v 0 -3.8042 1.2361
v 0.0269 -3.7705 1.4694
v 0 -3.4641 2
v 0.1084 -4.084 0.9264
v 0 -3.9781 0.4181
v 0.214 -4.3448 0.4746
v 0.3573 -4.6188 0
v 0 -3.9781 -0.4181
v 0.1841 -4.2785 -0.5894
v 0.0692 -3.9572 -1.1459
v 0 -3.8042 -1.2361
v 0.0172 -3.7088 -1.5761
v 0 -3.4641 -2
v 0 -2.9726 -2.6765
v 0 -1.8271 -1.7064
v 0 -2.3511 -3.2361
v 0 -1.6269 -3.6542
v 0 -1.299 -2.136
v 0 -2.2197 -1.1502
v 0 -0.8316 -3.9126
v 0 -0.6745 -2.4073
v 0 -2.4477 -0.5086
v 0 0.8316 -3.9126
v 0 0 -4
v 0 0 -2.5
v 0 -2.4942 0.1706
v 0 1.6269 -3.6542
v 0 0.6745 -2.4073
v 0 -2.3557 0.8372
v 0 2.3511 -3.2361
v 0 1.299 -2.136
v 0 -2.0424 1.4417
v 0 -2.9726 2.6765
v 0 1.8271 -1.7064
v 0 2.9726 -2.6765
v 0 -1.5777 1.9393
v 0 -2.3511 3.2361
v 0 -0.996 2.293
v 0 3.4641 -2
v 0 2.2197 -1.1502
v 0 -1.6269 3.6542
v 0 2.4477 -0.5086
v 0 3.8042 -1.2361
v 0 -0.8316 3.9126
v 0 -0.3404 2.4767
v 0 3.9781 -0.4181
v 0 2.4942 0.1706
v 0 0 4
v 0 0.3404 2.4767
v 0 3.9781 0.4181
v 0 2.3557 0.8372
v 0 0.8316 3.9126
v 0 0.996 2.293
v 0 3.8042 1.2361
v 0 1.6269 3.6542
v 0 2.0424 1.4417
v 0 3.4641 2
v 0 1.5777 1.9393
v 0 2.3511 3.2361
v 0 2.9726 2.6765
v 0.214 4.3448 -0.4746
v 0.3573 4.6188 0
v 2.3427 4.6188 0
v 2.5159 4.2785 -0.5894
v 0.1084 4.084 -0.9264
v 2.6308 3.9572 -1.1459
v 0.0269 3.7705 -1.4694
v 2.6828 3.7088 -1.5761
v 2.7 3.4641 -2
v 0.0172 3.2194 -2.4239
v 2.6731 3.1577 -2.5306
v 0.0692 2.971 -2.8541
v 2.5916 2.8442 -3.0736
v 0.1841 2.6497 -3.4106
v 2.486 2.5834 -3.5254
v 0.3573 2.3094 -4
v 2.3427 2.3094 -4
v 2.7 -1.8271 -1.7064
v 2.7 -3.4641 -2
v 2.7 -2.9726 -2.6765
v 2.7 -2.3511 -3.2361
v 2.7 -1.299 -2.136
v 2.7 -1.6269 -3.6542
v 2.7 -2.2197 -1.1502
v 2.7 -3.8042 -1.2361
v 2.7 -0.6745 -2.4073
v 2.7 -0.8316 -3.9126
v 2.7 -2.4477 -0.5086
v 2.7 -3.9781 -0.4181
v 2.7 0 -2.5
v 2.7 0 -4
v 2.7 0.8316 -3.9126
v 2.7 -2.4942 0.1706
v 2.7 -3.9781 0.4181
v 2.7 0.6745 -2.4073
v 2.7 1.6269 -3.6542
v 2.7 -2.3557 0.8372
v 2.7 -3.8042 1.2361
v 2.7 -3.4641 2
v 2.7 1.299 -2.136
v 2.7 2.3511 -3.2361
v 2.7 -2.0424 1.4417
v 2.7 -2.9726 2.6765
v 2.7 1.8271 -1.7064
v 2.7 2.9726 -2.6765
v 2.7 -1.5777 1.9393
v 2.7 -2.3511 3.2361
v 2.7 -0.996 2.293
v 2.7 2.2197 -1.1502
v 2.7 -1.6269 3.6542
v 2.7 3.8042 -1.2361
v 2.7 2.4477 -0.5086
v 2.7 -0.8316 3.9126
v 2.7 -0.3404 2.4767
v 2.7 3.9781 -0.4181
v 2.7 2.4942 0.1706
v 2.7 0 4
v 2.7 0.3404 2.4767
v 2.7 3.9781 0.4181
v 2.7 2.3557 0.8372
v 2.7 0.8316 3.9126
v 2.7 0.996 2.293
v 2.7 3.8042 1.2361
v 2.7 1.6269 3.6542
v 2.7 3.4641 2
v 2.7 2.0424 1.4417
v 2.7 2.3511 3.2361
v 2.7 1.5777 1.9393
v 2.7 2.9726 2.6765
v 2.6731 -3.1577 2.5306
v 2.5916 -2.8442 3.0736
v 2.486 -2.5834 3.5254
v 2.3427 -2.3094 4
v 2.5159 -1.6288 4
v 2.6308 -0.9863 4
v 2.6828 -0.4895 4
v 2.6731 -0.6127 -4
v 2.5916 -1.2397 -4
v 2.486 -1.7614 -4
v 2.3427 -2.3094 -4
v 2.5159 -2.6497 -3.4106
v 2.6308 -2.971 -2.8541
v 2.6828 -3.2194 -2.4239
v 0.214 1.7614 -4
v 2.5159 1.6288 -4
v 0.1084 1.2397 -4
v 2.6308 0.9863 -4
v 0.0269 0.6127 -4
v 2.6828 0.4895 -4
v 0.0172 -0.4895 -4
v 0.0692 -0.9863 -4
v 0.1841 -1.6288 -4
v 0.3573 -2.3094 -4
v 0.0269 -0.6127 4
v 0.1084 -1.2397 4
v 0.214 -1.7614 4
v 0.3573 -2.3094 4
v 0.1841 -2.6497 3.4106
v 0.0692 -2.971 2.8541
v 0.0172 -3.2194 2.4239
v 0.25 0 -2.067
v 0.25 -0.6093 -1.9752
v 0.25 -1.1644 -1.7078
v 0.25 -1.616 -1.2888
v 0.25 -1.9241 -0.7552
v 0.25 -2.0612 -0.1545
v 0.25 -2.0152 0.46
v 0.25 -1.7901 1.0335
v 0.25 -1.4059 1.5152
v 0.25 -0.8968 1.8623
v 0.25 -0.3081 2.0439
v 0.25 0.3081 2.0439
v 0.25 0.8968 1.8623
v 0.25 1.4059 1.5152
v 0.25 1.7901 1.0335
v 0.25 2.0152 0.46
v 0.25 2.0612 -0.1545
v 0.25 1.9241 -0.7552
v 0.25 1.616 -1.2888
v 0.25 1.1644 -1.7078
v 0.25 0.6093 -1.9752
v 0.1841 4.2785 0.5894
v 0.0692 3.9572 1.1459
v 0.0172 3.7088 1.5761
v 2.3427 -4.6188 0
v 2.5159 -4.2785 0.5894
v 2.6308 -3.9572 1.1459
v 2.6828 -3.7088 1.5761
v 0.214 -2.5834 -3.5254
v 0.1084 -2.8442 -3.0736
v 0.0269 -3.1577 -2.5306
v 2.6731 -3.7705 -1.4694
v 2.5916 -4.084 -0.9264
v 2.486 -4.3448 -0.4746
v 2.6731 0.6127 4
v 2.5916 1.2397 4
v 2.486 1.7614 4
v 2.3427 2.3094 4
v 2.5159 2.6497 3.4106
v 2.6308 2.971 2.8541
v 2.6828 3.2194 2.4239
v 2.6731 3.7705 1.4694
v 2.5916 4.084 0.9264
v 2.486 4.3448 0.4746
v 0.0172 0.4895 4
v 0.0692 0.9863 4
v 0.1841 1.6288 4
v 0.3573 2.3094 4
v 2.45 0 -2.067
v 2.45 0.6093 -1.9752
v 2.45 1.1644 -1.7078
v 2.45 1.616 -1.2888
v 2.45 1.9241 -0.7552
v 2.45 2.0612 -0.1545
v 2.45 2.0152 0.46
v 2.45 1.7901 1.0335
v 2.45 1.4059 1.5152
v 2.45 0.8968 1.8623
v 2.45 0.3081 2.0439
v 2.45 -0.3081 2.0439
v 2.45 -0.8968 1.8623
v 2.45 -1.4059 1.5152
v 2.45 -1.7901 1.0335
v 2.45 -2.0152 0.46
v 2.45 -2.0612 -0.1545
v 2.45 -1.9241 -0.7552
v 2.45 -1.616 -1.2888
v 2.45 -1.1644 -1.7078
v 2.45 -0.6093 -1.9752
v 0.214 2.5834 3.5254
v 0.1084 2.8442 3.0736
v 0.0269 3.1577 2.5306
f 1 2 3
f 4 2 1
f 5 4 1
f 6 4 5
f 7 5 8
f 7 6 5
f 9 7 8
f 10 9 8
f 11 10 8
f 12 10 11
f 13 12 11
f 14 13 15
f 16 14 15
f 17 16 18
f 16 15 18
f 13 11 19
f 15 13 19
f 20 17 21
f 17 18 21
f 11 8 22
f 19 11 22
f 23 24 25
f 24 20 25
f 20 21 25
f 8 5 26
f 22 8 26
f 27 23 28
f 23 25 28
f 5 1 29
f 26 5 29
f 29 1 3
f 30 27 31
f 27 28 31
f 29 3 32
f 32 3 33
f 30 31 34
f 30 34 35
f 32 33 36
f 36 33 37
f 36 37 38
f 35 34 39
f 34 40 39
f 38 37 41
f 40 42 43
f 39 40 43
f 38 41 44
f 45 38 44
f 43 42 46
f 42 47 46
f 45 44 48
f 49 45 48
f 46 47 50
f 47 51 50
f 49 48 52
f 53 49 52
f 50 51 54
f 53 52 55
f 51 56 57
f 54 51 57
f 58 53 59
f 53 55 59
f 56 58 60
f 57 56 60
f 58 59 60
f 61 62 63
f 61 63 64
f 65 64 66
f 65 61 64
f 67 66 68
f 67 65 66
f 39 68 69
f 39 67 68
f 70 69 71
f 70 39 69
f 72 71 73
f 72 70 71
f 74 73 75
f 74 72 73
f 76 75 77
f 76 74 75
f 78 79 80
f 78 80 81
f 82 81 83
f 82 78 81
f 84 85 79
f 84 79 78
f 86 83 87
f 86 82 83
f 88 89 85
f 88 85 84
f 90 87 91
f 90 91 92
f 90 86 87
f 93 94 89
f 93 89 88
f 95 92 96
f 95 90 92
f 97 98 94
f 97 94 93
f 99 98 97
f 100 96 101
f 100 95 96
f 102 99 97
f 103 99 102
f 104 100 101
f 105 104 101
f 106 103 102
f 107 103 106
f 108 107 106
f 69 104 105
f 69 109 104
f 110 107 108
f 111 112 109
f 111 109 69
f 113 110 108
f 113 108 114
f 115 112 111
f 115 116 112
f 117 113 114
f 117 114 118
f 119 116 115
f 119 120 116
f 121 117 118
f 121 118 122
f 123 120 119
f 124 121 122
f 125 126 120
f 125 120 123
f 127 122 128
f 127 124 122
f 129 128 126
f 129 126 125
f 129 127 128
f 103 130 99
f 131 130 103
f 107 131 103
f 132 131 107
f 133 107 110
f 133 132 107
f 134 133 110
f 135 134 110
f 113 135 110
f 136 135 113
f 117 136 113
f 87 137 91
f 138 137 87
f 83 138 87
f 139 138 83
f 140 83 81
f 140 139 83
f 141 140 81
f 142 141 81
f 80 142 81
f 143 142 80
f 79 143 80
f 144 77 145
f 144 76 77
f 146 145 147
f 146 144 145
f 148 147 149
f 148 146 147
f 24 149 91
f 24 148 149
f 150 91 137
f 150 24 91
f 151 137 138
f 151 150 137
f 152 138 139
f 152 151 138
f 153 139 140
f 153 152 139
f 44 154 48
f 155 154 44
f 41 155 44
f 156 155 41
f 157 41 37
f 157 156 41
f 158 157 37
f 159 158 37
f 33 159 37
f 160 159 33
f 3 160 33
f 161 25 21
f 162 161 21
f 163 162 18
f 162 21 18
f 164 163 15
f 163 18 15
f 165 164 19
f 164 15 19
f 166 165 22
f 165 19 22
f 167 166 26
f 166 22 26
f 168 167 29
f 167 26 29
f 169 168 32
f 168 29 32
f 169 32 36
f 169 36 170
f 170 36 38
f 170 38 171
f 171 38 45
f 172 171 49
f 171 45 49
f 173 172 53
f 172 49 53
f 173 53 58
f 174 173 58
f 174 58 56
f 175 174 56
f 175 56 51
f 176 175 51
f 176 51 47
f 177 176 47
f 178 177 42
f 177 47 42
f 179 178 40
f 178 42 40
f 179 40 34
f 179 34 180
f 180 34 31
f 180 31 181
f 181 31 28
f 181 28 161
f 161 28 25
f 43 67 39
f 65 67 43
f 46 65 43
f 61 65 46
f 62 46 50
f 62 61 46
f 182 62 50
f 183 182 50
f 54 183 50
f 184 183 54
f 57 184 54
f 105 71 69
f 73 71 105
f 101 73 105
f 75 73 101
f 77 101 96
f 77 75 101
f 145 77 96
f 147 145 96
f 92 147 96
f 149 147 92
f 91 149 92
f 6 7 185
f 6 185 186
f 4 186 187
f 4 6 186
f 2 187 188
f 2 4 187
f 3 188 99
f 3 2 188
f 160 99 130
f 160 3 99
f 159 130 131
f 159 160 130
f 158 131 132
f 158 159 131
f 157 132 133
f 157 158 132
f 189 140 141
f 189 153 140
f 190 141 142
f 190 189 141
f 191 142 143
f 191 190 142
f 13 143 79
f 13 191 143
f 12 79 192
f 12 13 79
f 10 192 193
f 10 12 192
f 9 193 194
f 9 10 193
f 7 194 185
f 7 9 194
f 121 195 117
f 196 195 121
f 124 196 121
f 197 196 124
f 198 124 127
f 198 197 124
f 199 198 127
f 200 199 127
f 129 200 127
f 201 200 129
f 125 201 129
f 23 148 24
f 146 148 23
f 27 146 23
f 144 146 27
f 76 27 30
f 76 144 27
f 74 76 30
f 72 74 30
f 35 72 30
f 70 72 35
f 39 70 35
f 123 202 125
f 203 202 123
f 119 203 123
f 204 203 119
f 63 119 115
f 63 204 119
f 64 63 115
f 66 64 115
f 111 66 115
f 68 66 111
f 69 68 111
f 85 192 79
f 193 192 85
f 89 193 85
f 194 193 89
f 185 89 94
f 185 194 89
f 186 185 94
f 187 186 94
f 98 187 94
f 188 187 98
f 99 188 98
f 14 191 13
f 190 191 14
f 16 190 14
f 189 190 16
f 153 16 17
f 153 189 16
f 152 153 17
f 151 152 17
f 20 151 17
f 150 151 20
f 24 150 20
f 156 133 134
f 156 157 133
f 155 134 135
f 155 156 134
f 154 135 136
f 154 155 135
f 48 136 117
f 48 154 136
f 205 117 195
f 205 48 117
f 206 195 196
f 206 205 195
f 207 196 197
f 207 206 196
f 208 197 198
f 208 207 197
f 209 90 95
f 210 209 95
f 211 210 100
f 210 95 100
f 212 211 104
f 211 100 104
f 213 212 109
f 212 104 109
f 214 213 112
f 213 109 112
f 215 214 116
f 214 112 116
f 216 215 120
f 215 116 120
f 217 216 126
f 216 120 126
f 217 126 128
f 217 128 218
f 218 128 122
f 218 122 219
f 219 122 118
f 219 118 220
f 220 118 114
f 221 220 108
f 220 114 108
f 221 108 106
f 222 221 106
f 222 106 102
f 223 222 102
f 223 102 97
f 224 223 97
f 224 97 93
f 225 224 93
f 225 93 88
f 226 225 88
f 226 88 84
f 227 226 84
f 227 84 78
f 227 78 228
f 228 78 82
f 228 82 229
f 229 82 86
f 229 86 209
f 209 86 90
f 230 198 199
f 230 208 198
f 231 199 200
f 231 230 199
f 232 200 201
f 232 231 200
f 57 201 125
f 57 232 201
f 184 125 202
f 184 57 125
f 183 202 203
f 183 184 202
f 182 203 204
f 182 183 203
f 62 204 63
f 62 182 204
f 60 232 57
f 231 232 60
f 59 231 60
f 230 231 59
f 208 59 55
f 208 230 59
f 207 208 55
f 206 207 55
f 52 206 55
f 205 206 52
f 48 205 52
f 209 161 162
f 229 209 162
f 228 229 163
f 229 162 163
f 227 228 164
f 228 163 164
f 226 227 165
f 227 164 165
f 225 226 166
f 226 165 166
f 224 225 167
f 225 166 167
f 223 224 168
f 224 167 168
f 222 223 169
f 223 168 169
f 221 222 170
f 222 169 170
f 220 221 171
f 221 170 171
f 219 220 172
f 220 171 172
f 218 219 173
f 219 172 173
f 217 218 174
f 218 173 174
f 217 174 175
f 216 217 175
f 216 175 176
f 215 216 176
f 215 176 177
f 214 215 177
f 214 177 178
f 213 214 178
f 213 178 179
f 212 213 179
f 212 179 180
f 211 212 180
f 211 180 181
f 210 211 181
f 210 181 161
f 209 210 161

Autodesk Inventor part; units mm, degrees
ref_plane "YZ Plane" through (0, 0, 0) normal (1, 0, 0) x (0, 1, 0)
ref_plane "XZ Plane" through (0, 0, 0) normal (0, 1, 0) x (-1, 0, 0)
sketch "Sketch1" plane through (0, 0, 0) normal (1, 0, 0) x (0, 1, 0)
  line L0 (-4.6188, 0) -> (-2.3094, 4)
  line L1 (-2.3094, 4) -> (2.3094, 4)
  line L2 (2.3094, 4) -> (4.6188, 0)
  line L3 (4.6188, 0) -> (2.3094, -4)
  line L4 (2.3094, -4) -> (-2.3094, -4)
  line L5 (-2.3094, -4) -> (-4.6188, 0)
  point P0 (0, 0)
  point P1 (0, 0)
  dimension "d0" = 9.2376
extrude "Body" add sketch "Sketch1" along normal blind 2.7
sketch "Sketch2" plane through (0, 0, 0) normal (0, 0, 1) x (1, 0, 0)
  line L0 (0, 2.3094) -> (0, 4.6188) projected
  line L1 (0, 4.6188) -> (2.7, 4.6188) projected
  line L2 (2.7, 2.3094) -> (2.7, 4.6188) projected
  line L3 (-0.54, 0) -> (3.24, 0) projected
  line L4 (0.3573, 4.6188) -> (0, 4)
  line L5 (2.3427, 4.6188) -> (2.7, 4)
  dimension "d3" = 30
  dimension "d4" = 30
  dimension "d5" = 8
  dimension "d6" = 8
revolve "Chamfer1" cut sketch "Sketch2" angle 360 about axis through (-10, 0, 0) along (1, 0, 0)
sketch "Sketch3" plane through (2.7, 0, 0) normal (1, 0, 0) x (0, 0, -1)
  arc A0 (-2, -3.4641) -> (2, -3.4641) centre (0, 0) ccw projected
hole "Thread" at (2.7, 0, 0) direction (-1, 0, 0) diameter 4.134 end through all thread size "M5x0.8" class "6H" standard "ANSI Metric M Profile"
chamfer "Chamfer2" distance 0.433 angle 30 1 edges at (2.7, 0, 2.067) measured on face at (2.7, 3.336, -0.083)
chamfer "Chamfer3" distance 0.433 angle 30 1 edges at (0, 0, 2.067) measured on face at (0, 3.336, -0.083)
ref_plane "Work Plane1" through (-9.8149, 0, 0) normal (0, -0.866, -0.5) x (1, 0, 0)
equation "\"d0\" = 1.1547 * SW"
equation "\"d1\" = KOH"
equation "\"d3\" = ANG1"
equation "\"d4\" = ANG2"
equation "\"d5\" = SW0"
equation "\"d6\" = SW01"
equation "\"d8\" = -0.5 * GD1 + 0.5 * NND"
equation "\"d40\" = -0.5 * GD1 + 0.5 * NND"
equation "\"d10\" = -0.5 * GD1 + 0.5 * NND"
equation "\"d41\" = -0.5 * GD1 + 0.5 * NND"
equation "\"ANG1\" = 30deg"
equation "\"ANG2\" = 30deg"
equation "\"NND\" = 5"
equation "\"KOH\" = 2.7"
equation "\"SW\" = 8"
equation "\"SW0\" = SW"
equation "\"SW01\" = SW"
equation "\"GUL\" = 0.541266 * PTC"
equation "\"THREADDIA\" = 5"
equation "\"TOA\" = 30deg"
equation "\"PTC\" = 0.8"
equation "\"E0\" = 1.155 * SW"
equation "\"GAL\" = 0.541266 * PTC"
equation "\"GD1\" = 4.133975"
properties part number "PWTR-0104" material "Steel, Mild"
